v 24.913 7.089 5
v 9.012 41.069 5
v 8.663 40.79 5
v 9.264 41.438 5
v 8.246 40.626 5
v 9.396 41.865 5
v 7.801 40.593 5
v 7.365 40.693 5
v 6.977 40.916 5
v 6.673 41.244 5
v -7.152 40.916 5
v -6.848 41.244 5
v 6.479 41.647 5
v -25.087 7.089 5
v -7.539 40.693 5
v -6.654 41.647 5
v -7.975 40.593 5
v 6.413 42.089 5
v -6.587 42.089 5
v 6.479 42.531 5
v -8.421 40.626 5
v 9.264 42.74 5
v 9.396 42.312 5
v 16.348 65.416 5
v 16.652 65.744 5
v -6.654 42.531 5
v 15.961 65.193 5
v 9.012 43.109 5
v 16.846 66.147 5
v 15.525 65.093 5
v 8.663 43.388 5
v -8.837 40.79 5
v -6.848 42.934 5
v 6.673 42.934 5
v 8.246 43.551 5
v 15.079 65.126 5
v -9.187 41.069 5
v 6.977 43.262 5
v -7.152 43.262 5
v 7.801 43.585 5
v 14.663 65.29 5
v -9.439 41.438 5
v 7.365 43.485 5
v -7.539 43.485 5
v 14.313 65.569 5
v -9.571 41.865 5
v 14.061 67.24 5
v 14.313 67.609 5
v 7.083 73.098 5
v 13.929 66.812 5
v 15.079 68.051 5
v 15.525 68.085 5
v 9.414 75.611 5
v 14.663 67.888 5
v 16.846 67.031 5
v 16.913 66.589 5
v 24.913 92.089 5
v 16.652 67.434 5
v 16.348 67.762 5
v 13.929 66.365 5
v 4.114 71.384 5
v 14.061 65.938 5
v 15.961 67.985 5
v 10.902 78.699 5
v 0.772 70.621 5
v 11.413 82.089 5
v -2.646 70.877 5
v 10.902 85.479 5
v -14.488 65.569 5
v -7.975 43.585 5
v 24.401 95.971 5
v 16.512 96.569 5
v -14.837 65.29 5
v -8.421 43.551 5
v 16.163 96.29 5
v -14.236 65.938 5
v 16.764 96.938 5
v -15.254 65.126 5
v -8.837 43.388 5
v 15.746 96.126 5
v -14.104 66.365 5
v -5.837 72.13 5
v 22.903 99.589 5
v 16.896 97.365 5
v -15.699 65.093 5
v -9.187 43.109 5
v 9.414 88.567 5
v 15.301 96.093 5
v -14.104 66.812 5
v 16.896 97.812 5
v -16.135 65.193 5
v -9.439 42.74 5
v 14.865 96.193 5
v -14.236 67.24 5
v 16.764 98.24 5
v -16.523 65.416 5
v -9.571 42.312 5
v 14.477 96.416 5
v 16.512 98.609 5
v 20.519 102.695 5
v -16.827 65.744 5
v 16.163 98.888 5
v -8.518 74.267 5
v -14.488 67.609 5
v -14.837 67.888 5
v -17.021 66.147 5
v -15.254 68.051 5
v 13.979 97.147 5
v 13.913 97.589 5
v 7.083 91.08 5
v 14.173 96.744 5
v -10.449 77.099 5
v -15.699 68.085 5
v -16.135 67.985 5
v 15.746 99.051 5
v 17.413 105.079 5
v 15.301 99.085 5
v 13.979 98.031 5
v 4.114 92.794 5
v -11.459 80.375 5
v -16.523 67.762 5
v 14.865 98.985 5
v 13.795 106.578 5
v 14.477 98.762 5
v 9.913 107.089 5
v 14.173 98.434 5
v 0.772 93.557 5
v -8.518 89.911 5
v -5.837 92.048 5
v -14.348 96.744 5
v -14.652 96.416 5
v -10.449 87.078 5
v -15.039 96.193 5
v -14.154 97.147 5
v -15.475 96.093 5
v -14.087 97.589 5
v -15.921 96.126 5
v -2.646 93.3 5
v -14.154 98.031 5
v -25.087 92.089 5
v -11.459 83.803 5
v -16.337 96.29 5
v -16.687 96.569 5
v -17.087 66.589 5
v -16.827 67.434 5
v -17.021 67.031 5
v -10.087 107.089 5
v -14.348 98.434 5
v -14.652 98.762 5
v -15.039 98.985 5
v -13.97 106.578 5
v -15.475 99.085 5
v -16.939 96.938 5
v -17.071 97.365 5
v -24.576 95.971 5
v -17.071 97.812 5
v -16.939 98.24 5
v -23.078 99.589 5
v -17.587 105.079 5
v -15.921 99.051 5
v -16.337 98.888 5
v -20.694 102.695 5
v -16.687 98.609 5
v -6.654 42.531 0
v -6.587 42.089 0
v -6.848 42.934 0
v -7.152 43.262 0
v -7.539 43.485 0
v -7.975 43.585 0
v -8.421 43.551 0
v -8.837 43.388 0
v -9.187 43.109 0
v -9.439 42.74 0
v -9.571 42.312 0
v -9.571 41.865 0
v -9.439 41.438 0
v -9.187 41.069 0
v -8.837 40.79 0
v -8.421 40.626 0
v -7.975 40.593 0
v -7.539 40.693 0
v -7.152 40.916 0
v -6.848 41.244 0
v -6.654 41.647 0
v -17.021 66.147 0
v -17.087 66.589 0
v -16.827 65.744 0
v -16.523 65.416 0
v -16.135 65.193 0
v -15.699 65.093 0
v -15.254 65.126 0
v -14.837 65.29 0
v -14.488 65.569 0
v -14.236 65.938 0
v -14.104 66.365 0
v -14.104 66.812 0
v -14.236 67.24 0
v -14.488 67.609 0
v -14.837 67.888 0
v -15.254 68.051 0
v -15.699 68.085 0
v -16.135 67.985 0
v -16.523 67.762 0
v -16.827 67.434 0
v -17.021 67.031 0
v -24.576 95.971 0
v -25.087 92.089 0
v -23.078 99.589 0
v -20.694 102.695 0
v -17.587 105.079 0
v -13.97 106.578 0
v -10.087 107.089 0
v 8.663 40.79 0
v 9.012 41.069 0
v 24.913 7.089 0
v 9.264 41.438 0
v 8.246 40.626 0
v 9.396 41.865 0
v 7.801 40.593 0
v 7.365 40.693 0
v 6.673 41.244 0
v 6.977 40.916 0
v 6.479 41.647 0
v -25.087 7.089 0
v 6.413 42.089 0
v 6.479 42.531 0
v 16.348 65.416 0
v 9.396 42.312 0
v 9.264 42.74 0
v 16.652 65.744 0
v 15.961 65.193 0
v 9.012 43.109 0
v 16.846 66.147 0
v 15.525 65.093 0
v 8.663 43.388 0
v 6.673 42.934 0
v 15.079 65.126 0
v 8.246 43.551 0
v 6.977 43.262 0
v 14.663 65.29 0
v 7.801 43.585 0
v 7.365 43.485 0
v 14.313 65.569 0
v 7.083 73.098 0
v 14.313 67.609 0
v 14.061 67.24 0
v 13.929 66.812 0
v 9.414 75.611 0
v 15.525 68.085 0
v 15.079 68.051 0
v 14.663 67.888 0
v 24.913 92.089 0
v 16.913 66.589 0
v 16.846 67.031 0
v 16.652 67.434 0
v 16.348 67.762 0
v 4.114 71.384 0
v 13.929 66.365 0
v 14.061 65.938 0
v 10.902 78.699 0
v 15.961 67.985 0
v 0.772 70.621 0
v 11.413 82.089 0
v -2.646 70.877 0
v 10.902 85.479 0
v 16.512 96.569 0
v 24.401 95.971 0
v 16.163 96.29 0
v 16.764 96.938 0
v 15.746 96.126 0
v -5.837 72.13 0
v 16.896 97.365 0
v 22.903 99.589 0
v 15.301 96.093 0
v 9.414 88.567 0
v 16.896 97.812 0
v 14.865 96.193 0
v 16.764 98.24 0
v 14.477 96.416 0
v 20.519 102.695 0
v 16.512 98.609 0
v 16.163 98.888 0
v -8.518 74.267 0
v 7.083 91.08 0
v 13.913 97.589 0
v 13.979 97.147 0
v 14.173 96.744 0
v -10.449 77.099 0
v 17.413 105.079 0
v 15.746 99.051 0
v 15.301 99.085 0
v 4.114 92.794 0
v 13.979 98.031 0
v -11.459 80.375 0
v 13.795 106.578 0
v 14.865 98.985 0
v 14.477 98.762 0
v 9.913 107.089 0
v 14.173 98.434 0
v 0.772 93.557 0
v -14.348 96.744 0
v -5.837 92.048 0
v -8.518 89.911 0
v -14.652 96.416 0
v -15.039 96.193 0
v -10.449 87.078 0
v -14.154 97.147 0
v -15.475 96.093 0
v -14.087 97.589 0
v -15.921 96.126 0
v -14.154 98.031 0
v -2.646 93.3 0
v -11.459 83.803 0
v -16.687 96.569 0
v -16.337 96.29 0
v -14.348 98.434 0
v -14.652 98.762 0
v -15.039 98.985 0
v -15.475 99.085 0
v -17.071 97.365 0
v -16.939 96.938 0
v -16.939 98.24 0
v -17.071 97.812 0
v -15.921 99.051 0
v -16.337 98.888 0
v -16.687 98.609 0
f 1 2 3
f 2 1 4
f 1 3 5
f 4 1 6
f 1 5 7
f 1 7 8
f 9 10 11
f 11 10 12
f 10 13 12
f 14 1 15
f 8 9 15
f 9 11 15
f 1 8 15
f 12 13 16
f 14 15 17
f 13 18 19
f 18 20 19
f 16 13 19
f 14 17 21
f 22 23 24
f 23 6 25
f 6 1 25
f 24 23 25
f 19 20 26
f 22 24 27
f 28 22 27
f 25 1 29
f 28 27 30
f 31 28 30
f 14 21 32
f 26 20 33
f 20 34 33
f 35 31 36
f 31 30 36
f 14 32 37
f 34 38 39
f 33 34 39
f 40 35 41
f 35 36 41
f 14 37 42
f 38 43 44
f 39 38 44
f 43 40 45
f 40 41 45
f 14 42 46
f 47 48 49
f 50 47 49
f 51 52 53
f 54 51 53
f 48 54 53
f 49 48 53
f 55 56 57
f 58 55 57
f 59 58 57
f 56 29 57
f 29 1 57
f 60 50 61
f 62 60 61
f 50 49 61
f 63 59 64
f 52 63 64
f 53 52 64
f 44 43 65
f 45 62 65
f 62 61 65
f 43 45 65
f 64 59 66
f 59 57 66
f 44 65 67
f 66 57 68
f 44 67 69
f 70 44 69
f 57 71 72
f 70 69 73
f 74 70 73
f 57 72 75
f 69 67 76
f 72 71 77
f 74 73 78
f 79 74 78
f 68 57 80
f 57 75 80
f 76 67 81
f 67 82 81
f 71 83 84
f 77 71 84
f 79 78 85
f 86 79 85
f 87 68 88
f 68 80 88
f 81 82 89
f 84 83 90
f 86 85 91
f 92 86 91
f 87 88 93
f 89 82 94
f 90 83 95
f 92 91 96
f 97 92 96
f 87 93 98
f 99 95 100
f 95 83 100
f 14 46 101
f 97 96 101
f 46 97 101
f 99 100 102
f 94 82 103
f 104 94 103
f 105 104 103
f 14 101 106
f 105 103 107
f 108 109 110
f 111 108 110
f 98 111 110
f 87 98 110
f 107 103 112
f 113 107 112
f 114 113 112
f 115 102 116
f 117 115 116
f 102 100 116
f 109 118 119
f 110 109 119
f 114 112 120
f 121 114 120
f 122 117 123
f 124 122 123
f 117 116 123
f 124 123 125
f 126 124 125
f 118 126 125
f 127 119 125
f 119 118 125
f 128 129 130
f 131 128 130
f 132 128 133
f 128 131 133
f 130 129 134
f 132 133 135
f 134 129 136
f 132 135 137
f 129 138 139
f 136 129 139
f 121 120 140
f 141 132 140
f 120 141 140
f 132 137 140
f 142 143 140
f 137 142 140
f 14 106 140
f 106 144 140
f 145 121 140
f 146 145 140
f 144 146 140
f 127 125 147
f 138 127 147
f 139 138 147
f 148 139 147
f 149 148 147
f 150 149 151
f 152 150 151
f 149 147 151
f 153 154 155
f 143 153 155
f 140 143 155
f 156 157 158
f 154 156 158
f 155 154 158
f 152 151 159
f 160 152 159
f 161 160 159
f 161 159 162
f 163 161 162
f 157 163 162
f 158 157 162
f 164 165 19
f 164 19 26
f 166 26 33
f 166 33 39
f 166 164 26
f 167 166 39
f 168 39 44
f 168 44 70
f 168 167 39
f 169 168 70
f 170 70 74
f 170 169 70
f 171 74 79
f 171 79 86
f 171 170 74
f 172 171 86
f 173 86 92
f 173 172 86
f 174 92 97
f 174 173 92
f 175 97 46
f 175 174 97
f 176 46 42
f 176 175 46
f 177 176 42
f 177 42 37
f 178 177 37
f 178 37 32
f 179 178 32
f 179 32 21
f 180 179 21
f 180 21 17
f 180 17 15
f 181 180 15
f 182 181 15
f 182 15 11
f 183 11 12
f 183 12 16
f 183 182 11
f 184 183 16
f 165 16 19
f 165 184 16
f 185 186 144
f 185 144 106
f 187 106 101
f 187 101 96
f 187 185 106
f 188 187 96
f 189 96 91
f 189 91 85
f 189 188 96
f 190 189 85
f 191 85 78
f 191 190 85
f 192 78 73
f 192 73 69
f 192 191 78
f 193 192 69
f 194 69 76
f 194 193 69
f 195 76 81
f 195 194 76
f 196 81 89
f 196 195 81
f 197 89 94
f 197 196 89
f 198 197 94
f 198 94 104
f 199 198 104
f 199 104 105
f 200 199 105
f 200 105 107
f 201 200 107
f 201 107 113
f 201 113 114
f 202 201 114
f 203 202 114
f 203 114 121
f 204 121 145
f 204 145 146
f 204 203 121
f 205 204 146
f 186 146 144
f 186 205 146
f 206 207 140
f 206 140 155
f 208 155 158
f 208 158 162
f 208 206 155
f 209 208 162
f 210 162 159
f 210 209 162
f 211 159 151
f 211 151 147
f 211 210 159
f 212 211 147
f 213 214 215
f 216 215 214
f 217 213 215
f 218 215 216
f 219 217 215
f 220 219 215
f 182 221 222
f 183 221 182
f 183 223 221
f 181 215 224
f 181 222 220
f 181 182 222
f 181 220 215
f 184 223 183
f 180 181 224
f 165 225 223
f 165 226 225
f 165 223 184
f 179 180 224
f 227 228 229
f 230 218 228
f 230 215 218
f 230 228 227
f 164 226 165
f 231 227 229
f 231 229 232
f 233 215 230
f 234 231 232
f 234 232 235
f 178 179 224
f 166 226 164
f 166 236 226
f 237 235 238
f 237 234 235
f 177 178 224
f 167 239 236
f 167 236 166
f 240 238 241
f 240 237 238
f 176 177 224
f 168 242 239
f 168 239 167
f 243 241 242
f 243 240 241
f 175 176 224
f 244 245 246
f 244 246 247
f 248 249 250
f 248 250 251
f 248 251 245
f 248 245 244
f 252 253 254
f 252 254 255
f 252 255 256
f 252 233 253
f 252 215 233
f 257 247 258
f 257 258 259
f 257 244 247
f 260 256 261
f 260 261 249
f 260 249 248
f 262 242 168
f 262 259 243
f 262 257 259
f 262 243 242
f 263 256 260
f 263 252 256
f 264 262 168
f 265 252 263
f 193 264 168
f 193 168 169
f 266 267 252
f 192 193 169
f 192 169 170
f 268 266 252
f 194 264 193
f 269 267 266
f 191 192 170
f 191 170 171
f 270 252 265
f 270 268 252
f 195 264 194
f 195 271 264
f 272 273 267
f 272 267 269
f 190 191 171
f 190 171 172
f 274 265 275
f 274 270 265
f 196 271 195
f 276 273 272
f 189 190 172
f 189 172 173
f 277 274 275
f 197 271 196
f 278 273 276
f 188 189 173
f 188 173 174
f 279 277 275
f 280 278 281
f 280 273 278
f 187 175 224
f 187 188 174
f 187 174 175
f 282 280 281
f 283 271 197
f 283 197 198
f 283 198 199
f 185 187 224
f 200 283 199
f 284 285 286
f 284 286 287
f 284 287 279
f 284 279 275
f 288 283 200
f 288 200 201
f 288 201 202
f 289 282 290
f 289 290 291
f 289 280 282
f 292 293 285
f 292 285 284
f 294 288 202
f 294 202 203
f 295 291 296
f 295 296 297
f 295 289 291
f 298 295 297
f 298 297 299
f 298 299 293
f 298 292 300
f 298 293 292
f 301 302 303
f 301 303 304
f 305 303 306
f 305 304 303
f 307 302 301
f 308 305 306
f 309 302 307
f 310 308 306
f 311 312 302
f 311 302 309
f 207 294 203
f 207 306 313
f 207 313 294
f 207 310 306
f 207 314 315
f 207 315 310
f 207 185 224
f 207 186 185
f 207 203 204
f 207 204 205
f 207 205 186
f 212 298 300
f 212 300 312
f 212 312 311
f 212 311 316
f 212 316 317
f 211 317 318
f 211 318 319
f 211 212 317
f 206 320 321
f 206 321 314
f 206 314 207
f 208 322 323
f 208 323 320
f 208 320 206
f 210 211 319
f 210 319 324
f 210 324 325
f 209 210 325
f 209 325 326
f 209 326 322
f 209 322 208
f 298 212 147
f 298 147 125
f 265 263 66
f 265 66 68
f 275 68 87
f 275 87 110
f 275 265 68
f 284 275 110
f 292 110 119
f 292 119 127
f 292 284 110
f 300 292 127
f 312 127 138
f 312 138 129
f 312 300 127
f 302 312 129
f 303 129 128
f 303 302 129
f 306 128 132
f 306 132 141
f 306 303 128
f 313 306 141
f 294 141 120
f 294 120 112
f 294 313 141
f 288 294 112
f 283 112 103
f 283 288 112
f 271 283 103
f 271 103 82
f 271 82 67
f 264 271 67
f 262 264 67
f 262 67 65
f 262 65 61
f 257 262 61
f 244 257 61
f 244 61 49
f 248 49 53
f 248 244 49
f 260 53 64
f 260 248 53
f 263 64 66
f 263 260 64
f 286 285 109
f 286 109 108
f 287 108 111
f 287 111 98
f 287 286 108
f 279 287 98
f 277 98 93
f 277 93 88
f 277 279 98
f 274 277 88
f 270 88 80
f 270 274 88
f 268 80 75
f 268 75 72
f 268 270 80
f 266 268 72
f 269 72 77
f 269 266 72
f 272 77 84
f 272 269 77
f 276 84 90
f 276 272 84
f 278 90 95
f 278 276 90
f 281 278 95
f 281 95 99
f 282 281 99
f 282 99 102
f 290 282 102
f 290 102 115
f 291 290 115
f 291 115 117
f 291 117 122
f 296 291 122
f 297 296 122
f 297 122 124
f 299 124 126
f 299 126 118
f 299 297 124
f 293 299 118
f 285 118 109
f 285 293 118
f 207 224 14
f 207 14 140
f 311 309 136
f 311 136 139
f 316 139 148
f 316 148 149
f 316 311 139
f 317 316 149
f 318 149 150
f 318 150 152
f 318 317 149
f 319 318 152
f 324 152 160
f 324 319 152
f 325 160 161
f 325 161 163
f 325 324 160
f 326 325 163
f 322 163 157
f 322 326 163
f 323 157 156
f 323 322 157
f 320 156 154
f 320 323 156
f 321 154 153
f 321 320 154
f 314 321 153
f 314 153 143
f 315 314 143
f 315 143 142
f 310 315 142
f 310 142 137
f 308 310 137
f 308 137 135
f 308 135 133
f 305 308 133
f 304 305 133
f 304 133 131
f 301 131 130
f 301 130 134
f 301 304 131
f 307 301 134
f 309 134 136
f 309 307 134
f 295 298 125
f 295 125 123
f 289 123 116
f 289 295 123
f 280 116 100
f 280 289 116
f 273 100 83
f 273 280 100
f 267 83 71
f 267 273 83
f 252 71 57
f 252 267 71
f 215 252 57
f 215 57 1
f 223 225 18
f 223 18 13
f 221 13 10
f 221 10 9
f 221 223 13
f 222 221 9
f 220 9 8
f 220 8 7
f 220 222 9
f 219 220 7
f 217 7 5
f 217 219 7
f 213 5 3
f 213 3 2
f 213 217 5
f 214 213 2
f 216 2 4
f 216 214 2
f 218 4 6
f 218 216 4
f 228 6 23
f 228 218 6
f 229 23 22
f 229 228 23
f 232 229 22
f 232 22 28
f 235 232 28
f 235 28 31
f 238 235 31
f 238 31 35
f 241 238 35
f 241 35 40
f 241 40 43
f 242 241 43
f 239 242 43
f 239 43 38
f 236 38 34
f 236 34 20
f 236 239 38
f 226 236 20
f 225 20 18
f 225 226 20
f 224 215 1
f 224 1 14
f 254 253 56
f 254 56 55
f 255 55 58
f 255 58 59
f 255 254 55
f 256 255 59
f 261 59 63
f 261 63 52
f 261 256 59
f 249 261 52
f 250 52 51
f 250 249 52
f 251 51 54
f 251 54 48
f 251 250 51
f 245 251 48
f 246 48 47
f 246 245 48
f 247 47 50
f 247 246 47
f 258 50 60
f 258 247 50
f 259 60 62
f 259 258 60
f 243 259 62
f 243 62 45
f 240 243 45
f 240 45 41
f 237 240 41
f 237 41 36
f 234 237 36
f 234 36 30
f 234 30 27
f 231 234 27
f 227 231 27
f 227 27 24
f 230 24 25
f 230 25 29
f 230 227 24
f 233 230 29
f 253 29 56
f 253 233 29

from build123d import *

# Parameters (mm, degrees)
SKETCH4_R           = 11.5
SKETCH4_R_2         = 1.5
BOSS_EXTRUDE1_DEPTH = 5


with BuildPart() as part:
    # Sketch4 → Boss-Extrude1 (new body)
    with BuildSketch(Plane.XY):
        with BuildLine():
            Line((-10.087403903, 107.088819702), (9.912596097, 107.088819702))
            ThreePointArc((9.912596097, 107.088819702), (20.519197815, 102.695421419), (24.912596097, 92.088819702))
            Line((24.912596097, 92.088819702), (24.912596097, 7.088819702))
            Line((24.912596097, 7.088819702), (-25.087403903, 7.088819702))
            Line((-25.087403903, 7.088819702), (-25.087403903, 92.088819702))
            ThreePointArc((-25.087403903, 92.088819702), (-20.694005621, 102.695421419), (-10.087403903, 107.088819702))
        make_face()
        with Locations((-0.087403903, 82.088819702)):
            Circle(SKETCH4_R, mode=Mode.SUBTRACT)
        with Locations((15.412596097, 66.588819702)):
            Circle(SKETCH4_R_2, mode=Mode.SUBTRACT)
        with Locations(Location((-15.587403903, 66.588819702, 0), (0, 0, 180))):
            Circle(SKETCH4_R_2, mode=Mode.SUBTRACT)
        with Locations(Location((15.412596097, 97.588819702, 0), (0, 0, 180))):
            Circle(SKETCH4_R_2, mode=Mode.SUBTRACT)
        with Locations((-15.587403903, 97.588819702)):
            Circle(SKETCH4_R_2, mode=Mode.SUBTRACT)
        with Locations((-8.087403903, 42.088819702)):
            Circle(SKETCH4_R_2, mode=Mode.SUBTRACT)
        with Locations(Location((7.912596097, 42.088819702, 0), (0, 0, 180))):
            Circle(SKETCH4_R_2, mode=Mode.SUBTRACT)
    extrude(amount=BOSS_EXTRUDE1_DEPTH)


solid = part.part
